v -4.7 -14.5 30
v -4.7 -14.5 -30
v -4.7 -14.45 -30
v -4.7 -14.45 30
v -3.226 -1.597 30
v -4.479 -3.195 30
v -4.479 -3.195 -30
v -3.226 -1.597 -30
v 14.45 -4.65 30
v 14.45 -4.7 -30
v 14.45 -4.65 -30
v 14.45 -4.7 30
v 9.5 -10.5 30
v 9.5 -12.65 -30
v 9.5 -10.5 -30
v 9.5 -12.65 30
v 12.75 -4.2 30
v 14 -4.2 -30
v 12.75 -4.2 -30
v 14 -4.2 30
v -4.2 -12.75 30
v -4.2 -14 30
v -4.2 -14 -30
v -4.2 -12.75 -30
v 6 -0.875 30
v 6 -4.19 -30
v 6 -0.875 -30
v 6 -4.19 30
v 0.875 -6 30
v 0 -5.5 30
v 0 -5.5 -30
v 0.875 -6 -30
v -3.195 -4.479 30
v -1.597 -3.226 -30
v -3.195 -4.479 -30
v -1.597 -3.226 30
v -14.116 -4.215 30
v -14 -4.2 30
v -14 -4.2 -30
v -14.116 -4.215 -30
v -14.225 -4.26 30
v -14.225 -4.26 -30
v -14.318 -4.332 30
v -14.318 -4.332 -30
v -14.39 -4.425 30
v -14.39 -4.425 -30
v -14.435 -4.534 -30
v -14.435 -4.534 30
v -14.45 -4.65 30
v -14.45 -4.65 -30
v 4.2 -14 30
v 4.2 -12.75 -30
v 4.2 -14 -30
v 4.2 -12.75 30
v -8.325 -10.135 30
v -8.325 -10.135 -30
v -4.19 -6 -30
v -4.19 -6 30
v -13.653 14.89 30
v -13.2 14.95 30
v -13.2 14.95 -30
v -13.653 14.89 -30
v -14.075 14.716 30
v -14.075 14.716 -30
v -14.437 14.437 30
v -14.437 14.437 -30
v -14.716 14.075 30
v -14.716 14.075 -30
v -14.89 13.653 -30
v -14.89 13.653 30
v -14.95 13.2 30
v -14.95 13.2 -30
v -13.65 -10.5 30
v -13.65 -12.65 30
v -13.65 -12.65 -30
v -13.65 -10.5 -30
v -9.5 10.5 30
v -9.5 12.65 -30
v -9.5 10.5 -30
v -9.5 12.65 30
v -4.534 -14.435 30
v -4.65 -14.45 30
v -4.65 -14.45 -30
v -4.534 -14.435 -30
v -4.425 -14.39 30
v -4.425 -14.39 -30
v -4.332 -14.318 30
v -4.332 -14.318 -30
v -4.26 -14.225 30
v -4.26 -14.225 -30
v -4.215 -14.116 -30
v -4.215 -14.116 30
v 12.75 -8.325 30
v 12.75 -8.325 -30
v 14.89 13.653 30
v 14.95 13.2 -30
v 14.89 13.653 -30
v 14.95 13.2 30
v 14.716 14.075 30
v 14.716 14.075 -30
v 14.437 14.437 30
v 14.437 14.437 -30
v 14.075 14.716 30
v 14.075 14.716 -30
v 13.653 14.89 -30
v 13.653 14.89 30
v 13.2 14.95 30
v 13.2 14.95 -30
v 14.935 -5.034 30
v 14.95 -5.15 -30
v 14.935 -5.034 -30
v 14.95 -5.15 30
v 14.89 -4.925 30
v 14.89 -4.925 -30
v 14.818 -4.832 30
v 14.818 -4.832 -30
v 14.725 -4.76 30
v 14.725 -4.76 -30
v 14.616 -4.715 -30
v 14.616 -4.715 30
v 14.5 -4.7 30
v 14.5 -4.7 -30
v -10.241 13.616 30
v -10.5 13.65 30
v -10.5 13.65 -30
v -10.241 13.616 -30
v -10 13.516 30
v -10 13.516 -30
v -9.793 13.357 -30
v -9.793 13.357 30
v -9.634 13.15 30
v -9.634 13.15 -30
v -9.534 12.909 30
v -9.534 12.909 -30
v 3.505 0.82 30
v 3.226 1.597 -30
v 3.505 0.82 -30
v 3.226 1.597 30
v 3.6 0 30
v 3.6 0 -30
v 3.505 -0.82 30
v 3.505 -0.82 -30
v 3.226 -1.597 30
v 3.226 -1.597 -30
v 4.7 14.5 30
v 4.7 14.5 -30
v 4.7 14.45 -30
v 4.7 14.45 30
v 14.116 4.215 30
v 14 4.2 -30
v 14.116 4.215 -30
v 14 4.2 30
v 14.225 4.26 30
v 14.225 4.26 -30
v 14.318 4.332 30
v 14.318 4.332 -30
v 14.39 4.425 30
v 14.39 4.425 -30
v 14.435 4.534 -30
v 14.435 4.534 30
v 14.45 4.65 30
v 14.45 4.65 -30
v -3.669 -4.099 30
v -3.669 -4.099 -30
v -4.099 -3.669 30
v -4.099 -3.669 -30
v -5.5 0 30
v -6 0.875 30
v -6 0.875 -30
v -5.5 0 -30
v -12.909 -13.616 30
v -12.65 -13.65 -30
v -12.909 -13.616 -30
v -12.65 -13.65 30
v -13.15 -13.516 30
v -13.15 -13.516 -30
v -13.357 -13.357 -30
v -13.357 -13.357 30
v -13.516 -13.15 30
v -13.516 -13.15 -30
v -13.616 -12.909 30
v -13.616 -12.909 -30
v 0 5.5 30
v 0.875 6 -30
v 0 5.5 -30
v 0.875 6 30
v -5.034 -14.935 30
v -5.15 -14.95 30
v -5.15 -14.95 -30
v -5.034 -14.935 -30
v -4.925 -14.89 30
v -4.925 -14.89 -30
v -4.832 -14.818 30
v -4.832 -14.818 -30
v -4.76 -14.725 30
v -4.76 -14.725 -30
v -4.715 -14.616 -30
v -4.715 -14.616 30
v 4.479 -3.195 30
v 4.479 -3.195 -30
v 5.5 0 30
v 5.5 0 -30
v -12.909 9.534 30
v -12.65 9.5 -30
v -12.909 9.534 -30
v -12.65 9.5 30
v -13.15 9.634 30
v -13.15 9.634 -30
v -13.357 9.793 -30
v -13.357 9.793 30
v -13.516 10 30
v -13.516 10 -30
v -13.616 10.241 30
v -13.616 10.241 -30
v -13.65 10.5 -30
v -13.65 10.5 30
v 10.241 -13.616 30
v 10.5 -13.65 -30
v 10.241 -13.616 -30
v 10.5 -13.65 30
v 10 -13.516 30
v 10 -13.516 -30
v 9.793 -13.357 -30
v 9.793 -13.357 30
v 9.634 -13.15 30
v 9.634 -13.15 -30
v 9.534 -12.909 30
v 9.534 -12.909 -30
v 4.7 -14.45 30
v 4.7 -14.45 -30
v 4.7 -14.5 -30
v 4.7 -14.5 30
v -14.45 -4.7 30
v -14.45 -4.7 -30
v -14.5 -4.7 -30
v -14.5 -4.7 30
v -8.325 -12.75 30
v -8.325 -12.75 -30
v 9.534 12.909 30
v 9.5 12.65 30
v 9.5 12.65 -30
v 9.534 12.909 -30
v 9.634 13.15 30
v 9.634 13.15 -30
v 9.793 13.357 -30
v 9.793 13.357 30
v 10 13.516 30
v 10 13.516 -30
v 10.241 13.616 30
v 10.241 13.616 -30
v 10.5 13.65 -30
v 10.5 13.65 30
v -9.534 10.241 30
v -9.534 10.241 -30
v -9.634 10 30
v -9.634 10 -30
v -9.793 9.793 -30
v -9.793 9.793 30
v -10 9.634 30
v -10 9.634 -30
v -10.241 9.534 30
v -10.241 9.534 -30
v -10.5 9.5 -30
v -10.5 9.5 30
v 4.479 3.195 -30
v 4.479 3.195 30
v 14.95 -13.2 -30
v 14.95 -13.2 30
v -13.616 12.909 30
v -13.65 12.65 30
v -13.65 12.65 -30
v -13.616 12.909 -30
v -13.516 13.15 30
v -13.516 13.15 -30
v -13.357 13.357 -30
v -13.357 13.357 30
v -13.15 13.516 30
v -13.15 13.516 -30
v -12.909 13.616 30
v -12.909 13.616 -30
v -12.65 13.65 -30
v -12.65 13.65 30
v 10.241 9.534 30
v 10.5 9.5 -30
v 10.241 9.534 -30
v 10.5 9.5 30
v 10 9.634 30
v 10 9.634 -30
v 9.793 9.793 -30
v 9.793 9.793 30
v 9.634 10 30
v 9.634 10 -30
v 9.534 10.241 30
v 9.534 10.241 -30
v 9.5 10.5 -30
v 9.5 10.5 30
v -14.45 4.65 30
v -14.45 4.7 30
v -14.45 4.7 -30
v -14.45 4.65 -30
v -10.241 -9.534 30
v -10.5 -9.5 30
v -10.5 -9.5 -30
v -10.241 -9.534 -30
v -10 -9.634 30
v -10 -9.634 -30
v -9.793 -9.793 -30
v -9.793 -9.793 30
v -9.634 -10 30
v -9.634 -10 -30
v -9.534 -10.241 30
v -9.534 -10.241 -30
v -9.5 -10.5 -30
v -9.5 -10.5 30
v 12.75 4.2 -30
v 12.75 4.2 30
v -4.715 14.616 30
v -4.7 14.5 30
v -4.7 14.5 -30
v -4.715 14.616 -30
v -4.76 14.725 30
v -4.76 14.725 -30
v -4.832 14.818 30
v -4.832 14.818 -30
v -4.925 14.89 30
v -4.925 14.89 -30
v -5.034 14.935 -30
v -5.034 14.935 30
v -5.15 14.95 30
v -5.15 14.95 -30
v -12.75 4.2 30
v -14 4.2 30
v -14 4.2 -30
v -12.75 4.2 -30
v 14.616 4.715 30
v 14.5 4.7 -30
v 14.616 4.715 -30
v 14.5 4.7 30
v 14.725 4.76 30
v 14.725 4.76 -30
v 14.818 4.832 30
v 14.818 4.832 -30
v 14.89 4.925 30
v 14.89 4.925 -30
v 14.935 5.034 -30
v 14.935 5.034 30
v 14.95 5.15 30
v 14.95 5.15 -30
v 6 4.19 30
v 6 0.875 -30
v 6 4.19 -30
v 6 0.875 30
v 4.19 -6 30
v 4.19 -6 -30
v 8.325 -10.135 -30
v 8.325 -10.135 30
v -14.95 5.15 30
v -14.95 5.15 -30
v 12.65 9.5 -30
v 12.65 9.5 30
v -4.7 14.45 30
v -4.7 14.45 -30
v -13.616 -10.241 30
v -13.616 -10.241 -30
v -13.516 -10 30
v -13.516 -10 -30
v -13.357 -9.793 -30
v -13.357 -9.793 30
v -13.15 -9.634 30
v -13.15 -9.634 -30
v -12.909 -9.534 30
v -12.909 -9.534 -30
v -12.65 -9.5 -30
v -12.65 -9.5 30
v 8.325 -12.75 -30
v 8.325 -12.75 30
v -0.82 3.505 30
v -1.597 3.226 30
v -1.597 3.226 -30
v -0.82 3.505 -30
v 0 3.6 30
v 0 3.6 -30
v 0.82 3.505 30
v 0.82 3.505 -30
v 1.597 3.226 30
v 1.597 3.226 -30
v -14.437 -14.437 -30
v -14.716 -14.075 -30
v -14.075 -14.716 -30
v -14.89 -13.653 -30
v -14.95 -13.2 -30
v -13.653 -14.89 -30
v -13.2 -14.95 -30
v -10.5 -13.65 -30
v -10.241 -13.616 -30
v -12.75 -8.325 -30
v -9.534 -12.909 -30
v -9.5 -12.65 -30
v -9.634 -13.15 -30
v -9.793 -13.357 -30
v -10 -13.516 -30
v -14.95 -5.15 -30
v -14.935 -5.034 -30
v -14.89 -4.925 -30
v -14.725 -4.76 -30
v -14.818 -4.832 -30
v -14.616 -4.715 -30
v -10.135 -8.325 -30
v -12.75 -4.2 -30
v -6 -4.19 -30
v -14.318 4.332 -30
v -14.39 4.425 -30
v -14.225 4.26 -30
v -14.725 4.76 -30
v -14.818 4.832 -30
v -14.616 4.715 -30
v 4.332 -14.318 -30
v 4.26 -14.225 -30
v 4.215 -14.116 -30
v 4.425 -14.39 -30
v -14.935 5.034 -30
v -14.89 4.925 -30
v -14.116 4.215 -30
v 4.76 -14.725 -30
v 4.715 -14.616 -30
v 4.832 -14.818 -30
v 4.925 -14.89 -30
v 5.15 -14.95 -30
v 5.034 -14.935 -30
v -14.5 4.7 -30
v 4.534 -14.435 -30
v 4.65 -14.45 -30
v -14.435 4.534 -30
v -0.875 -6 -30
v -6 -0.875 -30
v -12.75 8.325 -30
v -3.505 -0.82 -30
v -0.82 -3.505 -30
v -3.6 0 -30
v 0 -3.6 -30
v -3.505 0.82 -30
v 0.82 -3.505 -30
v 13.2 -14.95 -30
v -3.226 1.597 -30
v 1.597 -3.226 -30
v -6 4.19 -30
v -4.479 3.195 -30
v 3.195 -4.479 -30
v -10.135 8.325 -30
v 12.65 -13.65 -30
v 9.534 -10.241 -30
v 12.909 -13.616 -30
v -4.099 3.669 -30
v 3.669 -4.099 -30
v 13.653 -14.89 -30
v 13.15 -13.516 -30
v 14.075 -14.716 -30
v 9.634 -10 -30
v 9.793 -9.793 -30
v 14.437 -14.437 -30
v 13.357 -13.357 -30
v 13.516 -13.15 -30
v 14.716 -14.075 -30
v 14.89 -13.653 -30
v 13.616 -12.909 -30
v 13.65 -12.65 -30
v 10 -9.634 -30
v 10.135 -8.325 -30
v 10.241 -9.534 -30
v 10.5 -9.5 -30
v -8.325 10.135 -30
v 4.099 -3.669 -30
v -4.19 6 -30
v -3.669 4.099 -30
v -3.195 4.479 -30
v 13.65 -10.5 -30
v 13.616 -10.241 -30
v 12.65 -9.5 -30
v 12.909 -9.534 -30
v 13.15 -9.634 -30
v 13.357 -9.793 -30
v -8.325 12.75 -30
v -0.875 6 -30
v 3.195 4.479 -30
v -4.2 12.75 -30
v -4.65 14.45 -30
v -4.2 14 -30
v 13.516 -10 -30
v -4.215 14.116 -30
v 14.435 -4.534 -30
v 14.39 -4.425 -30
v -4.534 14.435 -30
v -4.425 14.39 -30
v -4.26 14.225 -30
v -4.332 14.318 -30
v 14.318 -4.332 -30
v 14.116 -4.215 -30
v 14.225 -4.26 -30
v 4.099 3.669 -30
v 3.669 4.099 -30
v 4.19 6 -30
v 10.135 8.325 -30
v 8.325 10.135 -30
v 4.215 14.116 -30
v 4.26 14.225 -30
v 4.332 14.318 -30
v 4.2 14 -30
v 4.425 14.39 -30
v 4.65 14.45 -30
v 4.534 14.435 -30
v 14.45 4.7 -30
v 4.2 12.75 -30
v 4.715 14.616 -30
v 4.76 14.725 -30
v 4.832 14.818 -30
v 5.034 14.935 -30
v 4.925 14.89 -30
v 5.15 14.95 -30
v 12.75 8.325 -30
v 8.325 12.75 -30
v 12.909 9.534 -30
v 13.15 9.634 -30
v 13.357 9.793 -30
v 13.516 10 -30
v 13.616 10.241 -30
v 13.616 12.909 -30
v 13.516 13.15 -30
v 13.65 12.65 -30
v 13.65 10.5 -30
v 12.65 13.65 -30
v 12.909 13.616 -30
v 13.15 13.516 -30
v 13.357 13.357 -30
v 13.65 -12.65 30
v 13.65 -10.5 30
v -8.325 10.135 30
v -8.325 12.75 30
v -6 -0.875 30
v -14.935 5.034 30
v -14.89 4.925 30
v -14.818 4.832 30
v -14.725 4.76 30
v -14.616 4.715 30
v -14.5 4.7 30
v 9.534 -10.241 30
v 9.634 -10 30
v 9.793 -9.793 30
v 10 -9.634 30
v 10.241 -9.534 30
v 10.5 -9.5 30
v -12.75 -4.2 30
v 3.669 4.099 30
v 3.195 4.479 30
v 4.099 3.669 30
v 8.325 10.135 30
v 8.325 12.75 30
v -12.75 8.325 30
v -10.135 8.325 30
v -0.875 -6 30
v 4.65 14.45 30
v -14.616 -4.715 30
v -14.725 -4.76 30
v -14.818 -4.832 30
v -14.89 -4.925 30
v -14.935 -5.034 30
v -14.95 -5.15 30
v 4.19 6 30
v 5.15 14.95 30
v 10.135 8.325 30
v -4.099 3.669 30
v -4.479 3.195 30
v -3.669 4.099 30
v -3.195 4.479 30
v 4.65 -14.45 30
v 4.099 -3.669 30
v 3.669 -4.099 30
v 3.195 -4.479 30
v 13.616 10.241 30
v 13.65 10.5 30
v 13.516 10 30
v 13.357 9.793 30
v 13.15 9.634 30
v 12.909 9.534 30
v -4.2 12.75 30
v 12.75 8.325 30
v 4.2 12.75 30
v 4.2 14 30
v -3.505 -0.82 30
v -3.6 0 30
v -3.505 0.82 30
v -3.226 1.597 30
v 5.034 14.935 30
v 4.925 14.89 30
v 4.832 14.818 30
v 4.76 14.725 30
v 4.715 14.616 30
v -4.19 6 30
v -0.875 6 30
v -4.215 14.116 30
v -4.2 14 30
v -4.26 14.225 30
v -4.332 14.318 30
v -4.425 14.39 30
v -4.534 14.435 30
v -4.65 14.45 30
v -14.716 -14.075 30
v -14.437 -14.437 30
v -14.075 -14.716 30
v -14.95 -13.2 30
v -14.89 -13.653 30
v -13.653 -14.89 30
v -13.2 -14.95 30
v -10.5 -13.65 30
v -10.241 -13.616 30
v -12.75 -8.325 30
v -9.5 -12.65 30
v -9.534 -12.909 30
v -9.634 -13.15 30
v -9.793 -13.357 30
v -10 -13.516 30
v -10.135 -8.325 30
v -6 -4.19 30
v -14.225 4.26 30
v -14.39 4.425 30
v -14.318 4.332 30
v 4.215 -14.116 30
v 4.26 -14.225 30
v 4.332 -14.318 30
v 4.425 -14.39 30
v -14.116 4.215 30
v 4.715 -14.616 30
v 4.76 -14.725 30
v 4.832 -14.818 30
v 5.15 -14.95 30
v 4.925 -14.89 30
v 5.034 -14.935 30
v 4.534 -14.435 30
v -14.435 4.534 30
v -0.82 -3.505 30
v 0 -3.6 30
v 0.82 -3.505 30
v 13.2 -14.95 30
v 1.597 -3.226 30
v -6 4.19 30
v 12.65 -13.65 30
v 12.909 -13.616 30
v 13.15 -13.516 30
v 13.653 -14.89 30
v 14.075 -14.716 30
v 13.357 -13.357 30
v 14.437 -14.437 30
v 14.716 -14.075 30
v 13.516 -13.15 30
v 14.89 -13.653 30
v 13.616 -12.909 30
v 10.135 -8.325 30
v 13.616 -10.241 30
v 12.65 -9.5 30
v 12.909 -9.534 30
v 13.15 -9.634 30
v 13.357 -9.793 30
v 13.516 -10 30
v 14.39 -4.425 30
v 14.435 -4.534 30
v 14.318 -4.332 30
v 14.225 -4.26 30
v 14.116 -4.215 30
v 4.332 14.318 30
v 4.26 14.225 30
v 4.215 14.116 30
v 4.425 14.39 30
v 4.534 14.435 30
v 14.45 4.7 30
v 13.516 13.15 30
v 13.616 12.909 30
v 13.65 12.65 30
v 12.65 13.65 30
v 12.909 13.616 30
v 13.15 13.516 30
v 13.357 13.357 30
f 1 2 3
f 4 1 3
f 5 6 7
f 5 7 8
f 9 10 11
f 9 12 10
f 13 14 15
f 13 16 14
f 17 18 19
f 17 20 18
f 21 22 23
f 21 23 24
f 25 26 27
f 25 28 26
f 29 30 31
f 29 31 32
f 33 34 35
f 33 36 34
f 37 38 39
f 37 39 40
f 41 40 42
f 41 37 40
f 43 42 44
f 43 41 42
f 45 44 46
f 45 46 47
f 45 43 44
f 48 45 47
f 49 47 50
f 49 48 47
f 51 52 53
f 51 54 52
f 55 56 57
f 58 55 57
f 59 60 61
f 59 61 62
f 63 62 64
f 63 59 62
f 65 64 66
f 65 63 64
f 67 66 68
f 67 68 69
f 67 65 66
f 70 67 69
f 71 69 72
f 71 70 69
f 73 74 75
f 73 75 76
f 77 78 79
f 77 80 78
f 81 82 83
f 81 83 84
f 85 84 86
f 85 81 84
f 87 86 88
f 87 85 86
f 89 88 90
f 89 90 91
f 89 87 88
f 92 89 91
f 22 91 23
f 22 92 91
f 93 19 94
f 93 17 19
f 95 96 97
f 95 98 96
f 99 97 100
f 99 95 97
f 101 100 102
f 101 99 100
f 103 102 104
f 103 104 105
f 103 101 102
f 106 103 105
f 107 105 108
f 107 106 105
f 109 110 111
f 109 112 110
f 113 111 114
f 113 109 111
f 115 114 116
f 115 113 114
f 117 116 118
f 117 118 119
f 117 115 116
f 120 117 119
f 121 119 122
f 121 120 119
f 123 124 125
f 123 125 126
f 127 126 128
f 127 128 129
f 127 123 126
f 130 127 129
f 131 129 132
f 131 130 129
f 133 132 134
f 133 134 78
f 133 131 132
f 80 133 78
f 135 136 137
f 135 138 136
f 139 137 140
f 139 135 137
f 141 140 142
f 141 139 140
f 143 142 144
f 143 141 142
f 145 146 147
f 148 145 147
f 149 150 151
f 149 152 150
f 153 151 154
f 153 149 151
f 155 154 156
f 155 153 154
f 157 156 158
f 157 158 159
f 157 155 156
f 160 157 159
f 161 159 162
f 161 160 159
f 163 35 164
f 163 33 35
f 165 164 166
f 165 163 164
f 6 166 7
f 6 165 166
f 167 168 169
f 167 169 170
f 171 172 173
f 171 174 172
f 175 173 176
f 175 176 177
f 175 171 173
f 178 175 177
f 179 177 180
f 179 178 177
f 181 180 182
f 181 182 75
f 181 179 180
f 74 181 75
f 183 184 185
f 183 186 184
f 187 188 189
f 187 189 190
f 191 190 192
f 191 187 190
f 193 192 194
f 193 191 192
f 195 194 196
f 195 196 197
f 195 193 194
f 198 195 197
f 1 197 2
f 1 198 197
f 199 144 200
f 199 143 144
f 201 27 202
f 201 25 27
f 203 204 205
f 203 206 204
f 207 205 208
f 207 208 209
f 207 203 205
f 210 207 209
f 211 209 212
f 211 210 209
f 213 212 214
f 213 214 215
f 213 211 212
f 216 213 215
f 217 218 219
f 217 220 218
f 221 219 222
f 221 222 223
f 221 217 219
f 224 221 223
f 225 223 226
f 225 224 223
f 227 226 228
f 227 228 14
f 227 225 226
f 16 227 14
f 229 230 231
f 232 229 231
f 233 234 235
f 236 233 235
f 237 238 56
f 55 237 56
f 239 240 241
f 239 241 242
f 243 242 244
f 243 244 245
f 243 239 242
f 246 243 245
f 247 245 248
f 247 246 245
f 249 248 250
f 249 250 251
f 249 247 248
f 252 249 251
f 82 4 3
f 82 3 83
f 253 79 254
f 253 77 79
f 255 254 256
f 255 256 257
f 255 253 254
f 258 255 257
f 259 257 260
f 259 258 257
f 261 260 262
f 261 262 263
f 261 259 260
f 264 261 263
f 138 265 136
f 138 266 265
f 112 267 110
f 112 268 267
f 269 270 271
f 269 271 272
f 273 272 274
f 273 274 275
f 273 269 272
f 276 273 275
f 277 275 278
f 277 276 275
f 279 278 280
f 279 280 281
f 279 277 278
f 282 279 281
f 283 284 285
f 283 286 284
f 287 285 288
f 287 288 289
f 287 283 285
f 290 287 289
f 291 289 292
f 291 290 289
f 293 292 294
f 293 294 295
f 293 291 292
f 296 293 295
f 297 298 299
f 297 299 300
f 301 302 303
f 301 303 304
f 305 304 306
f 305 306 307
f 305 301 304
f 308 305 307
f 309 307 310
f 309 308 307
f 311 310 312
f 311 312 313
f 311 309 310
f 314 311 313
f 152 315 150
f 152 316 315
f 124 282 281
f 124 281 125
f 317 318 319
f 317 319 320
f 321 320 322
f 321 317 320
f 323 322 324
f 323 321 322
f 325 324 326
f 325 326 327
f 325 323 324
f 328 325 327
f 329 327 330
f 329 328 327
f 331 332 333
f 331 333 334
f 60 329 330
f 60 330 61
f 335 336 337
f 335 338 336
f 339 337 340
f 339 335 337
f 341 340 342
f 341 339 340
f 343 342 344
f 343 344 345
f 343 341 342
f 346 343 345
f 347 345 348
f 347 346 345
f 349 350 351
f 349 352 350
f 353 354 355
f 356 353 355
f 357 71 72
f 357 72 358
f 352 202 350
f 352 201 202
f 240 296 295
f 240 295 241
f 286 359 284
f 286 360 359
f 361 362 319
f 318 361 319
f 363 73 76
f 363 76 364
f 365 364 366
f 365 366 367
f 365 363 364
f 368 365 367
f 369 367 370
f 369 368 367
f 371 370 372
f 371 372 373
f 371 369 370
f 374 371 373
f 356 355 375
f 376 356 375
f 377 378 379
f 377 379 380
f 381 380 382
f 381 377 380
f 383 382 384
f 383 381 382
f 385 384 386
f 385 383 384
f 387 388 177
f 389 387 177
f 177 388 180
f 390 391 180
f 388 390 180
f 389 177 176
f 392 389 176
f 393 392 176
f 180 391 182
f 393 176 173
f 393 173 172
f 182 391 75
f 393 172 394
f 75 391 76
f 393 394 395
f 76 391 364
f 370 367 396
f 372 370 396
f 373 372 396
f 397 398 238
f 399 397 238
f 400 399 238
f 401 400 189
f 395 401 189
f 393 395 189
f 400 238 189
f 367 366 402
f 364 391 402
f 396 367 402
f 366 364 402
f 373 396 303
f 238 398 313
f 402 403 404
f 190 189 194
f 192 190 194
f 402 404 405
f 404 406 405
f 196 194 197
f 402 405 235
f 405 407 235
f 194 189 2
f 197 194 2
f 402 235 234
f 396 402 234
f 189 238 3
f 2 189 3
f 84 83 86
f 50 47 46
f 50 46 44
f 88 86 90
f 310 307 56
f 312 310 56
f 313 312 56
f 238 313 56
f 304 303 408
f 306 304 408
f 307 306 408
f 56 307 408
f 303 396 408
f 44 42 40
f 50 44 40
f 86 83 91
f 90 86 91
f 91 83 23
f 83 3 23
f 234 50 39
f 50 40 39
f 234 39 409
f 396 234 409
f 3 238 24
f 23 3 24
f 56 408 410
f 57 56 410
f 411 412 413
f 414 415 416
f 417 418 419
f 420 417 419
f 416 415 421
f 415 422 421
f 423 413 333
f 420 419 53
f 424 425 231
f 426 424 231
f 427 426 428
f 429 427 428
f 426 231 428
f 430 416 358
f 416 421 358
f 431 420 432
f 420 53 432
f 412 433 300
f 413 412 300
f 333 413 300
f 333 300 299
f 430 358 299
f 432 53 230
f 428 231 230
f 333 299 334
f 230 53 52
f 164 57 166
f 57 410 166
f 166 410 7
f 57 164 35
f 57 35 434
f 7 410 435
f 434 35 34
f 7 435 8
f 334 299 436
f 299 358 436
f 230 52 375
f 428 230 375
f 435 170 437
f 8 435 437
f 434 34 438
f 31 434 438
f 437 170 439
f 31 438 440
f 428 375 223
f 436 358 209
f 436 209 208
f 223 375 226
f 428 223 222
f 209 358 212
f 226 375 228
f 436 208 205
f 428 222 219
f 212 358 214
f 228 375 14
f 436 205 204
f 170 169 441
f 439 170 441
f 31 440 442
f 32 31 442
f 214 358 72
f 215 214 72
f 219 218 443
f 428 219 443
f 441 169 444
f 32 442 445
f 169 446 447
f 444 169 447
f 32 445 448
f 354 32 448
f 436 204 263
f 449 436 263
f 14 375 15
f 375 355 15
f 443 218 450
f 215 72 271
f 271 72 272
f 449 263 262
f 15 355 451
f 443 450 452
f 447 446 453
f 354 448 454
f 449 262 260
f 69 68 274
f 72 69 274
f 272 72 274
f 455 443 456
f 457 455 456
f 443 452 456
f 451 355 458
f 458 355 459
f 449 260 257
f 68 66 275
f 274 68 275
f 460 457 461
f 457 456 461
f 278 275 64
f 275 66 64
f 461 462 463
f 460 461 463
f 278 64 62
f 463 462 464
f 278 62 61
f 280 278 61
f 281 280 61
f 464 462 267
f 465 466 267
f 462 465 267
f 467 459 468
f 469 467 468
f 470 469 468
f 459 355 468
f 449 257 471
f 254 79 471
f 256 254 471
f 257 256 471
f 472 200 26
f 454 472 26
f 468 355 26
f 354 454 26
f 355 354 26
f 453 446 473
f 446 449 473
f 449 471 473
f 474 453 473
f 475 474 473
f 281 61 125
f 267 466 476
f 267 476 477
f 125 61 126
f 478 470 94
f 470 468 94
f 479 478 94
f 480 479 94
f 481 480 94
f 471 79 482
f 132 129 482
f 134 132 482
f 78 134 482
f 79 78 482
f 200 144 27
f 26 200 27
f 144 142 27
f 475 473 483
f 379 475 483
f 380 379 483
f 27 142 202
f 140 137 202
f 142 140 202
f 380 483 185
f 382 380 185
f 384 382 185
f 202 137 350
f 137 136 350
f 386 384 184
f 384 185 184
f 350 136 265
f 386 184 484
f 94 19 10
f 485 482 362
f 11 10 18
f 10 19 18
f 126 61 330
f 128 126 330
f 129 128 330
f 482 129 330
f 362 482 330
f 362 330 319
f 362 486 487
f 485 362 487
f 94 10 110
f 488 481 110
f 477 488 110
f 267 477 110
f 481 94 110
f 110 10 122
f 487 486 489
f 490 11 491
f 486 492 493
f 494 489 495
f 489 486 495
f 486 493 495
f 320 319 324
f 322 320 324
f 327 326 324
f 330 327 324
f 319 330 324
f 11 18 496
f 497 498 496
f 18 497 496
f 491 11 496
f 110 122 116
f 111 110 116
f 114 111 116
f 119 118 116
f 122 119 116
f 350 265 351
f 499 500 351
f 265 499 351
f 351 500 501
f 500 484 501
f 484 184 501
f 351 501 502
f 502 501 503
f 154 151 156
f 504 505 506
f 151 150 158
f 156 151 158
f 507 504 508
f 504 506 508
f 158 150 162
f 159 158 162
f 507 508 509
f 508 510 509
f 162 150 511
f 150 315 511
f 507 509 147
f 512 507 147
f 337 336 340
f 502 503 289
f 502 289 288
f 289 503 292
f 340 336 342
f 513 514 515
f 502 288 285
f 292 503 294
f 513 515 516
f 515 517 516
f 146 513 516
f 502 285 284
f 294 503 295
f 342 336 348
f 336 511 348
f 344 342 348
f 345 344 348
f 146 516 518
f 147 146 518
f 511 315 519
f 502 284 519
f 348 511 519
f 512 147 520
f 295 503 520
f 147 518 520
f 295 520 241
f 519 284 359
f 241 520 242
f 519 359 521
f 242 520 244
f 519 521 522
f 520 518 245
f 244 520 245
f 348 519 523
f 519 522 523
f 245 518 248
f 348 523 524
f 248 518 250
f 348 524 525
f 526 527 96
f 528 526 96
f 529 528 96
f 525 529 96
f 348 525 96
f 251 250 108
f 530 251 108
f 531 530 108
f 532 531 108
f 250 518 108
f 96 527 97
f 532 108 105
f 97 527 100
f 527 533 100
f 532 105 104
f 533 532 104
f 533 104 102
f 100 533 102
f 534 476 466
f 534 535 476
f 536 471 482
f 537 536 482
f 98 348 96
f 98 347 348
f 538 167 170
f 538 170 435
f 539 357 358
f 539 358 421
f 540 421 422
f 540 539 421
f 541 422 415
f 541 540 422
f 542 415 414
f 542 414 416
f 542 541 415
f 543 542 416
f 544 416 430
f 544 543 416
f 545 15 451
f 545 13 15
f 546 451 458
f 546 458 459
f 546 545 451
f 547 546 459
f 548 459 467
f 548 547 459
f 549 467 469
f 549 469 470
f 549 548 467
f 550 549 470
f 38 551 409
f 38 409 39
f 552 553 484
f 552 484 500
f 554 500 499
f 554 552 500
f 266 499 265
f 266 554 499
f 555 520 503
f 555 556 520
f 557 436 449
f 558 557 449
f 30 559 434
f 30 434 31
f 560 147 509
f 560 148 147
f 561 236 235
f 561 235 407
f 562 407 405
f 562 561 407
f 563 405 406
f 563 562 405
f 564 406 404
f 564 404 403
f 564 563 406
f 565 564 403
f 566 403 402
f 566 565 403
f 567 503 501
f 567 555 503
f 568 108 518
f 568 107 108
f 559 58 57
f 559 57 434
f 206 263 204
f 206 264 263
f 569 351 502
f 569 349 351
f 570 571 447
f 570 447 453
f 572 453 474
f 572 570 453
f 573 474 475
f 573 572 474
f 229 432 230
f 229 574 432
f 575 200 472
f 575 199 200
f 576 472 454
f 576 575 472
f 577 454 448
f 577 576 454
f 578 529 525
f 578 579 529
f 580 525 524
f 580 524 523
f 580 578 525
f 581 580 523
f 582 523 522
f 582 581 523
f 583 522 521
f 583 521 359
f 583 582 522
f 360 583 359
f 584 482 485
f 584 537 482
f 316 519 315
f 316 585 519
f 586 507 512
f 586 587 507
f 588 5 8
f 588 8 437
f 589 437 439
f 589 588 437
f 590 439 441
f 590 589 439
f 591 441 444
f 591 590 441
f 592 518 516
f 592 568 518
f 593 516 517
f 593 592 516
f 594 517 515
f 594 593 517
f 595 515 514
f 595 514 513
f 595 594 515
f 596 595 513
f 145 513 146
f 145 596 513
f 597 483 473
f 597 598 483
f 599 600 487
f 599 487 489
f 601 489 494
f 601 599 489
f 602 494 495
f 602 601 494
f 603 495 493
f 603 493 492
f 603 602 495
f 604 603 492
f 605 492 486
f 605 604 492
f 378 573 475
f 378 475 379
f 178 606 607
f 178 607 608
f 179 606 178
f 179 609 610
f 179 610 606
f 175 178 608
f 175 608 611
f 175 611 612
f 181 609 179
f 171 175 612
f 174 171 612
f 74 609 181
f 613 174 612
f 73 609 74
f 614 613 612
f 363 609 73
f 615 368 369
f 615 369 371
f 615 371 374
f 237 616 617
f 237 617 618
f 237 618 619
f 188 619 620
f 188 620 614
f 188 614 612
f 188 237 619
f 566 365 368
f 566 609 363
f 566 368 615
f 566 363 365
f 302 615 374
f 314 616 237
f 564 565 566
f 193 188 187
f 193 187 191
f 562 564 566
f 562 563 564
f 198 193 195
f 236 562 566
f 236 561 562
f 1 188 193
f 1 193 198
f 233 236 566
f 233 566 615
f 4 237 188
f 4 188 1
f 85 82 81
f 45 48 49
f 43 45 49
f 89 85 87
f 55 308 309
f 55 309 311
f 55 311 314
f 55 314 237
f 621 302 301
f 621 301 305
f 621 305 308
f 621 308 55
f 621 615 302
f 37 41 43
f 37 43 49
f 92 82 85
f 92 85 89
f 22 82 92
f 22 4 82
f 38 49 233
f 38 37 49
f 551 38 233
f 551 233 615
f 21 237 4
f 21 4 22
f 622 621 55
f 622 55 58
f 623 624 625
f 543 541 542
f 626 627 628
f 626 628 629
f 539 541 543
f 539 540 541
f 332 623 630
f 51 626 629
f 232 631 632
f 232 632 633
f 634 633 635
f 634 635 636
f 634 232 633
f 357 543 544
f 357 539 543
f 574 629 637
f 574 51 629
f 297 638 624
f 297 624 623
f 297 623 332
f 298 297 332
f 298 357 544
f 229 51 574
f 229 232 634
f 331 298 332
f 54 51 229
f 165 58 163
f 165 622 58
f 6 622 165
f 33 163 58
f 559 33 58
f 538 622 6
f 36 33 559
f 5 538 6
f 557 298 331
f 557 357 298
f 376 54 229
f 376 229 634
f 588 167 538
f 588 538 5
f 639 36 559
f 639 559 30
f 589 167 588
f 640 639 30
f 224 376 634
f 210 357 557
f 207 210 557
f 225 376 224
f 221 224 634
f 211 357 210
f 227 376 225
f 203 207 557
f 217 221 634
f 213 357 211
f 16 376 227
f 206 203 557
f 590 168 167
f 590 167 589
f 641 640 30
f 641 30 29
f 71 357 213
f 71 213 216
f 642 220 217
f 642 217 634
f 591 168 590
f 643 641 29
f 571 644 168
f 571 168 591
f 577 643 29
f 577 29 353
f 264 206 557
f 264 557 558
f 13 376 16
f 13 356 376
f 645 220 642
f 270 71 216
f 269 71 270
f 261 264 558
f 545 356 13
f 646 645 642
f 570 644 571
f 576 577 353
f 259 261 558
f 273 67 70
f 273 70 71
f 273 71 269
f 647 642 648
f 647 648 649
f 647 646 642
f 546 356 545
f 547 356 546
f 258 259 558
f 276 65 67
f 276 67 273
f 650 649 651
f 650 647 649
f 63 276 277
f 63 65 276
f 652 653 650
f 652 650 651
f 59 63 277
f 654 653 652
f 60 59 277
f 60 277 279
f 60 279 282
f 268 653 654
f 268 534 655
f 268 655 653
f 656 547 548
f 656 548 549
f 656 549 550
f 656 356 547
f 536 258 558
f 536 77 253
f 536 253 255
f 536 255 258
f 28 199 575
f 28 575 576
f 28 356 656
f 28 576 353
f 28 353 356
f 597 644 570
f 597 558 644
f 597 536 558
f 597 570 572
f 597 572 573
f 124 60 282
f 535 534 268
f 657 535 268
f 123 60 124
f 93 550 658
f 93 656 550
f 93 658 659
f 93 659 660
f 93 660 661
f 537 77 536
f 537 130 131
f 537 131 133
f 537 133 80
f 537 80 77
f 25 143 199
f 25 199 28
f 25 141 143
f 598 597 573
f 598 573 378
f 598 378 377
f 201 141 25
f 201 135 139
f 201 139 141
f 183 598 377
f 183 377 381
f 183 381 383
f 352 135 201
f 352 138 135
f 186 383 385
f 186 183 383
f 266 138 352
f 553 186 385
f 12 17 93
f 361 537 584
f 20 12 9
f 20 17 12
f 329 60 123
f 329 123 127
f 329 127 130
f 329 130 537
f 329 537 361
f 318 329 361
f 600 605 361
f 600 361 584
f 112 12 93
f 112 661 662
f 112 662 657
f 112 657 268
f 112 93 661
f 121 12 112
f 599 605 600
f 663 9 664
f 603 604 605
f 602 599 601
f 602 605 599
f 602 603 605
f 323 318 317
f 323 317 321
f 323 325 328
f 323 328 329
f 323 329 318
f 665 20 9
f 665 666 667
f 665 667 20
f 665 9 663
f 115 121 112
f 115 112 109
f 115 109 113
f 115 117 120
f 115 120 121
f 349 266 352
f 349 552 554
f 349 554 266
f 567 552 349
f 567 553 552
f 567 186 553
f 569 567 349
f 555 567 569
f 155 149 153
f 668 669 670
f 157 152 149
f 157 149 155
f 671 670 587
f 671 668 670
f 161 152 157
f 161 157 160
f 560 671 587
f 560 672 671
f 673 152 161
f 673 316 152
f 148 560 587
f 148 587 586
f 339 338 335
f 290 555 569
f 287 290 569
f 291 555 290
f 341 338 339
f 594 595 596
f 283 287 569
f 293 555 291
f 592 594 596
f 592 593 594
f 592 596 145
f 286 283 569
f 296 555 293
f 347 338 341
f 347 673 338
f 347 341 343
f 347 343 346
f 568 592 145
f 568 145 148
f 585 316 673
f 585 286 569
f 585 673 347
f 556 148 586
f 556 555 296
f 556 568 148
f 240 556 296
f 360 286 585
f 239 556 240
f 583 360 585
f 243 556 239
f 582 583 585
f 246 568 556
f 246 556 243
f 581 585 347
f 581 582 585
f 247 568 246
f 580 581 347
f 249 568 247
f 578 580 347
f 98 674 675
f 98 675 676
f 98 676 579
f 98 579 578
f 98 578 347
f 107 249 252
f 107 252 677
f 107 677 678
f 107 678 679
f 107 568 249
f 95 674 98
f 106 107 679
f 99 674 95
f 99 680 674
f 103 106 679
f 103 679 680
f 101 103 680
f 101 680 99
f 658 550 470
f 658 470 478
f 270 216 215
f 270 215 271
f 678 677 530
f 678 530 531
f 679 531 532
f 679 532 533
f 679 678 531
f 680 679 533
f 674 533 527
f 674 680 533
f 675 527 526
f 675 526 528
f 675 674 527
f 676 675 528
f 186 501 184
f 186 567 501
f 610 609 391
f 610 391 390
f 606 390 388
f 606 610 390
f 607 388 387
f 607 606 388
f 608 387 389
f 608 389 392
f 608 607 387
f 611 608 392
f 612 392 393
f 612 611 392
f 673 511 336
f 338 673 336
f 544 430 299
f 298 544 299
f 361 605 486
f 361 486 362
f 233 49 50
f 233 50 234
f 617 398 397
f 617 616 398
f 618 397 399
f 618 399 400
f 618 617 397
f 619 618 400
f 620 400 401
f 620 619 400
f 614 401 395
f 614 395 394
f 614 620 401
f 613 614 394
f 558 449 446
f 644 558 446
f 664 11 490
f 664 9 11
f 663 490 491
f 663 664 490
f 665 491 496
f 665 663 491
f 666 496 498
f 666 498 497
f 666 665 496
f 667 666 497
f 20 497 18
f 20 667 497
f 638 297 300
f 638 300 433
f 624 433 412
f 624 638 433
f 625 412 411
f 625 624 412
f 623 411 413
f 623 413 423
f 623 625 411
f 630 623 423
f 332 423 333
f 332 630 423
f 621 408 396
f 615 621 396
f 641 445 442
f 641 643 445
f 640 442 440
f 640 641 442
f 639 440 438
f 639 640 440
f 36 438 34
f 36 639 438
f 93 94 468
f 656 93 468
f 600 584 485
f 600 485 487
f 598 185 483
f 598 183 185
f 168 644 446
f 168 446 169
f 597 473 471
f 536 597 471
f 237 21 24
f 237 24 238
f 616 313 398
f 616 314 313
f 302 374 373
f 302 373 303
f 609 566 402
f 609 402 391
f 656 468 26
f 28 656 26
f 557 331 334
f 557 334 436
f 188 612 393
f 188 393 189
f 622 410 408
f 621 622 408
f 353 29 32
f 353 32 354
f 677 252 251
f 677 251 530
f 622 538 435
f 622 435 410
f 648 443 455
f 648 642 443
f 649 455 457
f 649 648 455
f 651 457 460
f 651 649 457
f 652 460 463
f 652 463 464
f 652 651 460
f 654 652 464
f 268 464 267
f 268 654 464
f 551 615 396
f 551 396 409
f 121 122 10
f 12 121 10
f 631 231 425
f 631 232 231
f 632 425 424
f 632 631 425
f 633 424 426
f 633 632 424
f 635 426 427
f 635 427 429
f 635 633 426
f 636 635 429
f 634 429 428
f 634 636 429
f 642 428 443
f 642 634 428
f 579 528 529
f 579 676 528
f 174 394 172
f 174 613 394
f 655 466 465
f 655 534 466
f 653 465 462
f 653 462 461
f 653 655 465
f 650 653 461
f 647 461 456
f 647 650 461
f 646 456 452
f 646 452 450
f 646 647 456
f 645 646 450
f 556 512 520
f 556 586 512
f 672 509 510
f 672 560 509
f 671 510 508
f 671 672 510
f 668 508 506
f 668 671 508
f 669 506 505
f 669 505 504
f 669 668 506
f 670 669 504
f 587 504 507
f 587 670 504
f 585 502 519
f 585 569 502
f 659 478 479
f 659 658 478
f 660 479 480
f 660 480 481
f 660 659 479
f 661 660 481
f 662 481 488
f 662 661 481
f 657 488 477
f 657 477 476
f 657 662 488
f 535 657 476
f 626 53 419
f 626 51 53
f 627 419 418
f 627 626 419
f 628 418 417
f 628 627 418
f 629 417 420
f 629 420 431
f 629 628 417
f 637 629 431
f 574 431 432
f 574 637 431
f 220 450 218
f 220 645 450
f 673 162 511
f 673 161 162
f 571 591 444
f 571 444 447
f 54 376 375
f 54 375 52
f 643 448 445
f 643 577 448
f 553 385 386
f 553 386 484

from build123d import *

# Parameters (mm, degrees)
BOSS_EXTRUDE1_DEPTH = 30


with BuildPart() as part:
    # Sketch1 → Boss-Extrude1 (new body, symmetric)
    with BuildSketch(Plane.XY):
        with BuildLine():
            Line((-8.325, 12.75), (-4.2, 12.75))
            Line((-4.2, 12.75), (-4.2, 14))
            ThreePointArc((-4.2, 14), (-4.331801948, 14.318198052), (-4.65, 14.45))
            Line((-4.65, 14.45), (-4.7, 14.45))
            Line((-4.7, 14.45), (-4.7, 14.5))
            ThreePointArc((-4.7, 14.5), (-4.831801948, 14.818198052), (-5.15, 14.95))
            Line((-5.15, 14.95), (-13.2, 14.95))
            ThreePointArc((-13.2, 14.95), (-14.437436867, 14.437436867), (-14.95, 13.2))
            Line((-14.95, 13.2), (-14.95, 5.15))
            ThreePointArc((-14.95, 5.15), (-14.818198052, 4.831801948), (-14.5, 4.7))
            Line((-14.5, 4.7), (-14.45, 4.7))
            Line((-14.45, 4.7), (-14.45, 4.65))
            ThreePointArc((-14.45, 4.65), (-14.318198052, 4.331801948), (-14, 4.2))
            Line((-14, 4.2), (-12.75, 4.2))
            Line((-12.75, 4.2), (-12.75, 8.325))
            Line((-12.75, 8.325), (-10.13519336, 8.325))
            Line((-10.13519336, 8.325), (-6, 4.18980664))
            Line((-6, 4.18980664), (-6, 0.875))
            Line((-6, 0.875), (-5.5, 0))
            Line((-5.5, 0), (-6, -0.875))
            Line((-6, -0.875), (-6, -4.18980664))
            Line((-6, -4.18980664), (-10.13519336, -8.325))
            Line((-10.13519336, -8.325), (-12.75, -8.325))
            Line((-12.75, -8.325), (-12.75, -4.2))
            Line((-12.75, -4.2), (-14, -4.2))
            ThreePointArc((-14, -4.2), (-14.318198052, -4.331801948), (-14.45, -4.65))
            Line((-14.45, -4.65), (-14.45, -4.7))
            Line((-14.45, -4.7), (-14.5, -4.7))
            ThreePointArc((-14.5, -4.7), (-14.818198052, -4.831801948), (-14.95, -5.15))
            Line((-14.95, -5.15), (-14.95, -13.2))
            ThreePointArc((-14.95, -13.2), (-14.437436867, -14.437436867), (-13.2, -14.95))
            Line((-13.2, -14.95), (-5.15, -14.95))
            ThreePointArc((-5.15, -14.95), (-4.831801948, -14.818198052), (-4.7, -14.5))
            Line((-4.7, -14.5), (-4.7, -14.45))
            Line((-4.7, -14.45), (-4.65, -14.45))
            ThreePointArc((-4.65, -14.45), (-4.331801948, -14.318198052), (-4.2, -14))
            Line((-4.2, -14), (-4.2, -12.75))
            Line((-4.2, -12.75), (-8.325, -12.75))
            Line((-8.325, -12.75), (-8.325, -10.13519336))
            Line((-8.325, -10.13519336), (-4.18980664, -6))
            Line((-4.18980664, -6), (-0.875, -6))
            Line((-0.875, -6), (0, -5.5))
            Line((0, -5.5), (0.875, -6))
            Line((0.875, -6), (4.18980664, -6))
            Line((4.18980664, -6), (8.325, -10.13519336))
            Line((8.325, -10.13519336), (8.325, -12.75))
            Line((8.325, -12.75), (4.2, -12.75))
            Line((4.2, -12.75), (4.2, -14))
            ThreePointArc((4.2, -14), (4.331801948, -14.318198052), (4.65, -14.45))
            Line((4.65, -14.45), (4.7, -14.45))
            Line((4.7, -14.45), (4.7, -14.5))
            ThreePointArc((4.7, -14.5), (4.831801948, -14.818198052), (5.15, -14.95))
            Line((5.15, -14.95), (13.2, -14.95))
            ThreePointArc((13.2, -14.95), (14.437436867, -14.437436867), (14.95, -13.2))
            Line((14.95, -13.2), (14.95, -5.15))
            ThreePointArc((14.95, -5.15), (14.818198052, -4.831801948), (14.5, -4.7))
            Line((14.5, -4.7), (14.45, -4.7))
            Line((14.45, -4.7), (14.45, -4.65))
            ThreePointArc((14.45, -4.65), (14.318198052, -4.331801948), (14, -4.2))
            Line((14, -4.2), (12.75, -4.2))
            Line((12.75, -4.2), (12.75, -8.325))
            Line((12.75, -8.325), (10.13519336, -8.325))
            Line((10.13519336, -8.325), (6, -4.18980664))
            Line((6, -4.18980664), (6, -0.875))
            Line((6, -0.875), (5.5, 0))
            Line((5.5, 0), (6, 0.875))
            Line((6, 0.875), (6, 4.18980664))
            Line((6, 4.18980664), (10.134787333, 8.324593973))
            Line((10.134787333, 8.324593973), (12.75, 8.324593973))
            Line((12.75, 8.324593973), (12.75, 4.2))
            Line((12.75, 4.2), (14, 4.2))
            ThreePointArc((14, 4.2), (14.318198052, 4.331801948), (14.45, 4.65))
            Line((14.45, 4.65), (14.45, 4.7))
            Line((14.45, 4.7), (14.5, 4.7))
            ThreePointArc((14.5, 4.7), (14.818198052, 4.831801948), (14.95, 5.15))
            Line((14.95, 5.15), (14.95, 13.2))
            ThreePointArc((14.95, 13.2), (14.437436867, 14.437436867), (13.2, 14.95))
            Line((13.2, 14.95), (5.15, 14.95))
            ThreePointArc((5.15, 14.95), (4.831801948, 14.818198052), (4.7, 14.5))
            Line((4.7, 14.5), (4.7, 14.45))
            Line((4.7, 14.45), (4.65, 14.45))
            ThreePointArc((4.65, 14.45), (4.331801948, 14.318198052), (4.2, 14))
            Line((4.2, 14), (4.2, 12.75))
            Line((4.2, 12.75), (8.324593973, 12.75))
            Line((8.324593973, 12.75), (8.324593973, 10.134787333))
            Line((8.324593973, 10.134787333), (4.18980664, 6))
            Line((4.18980664, 6), (0.875, 6))
            Line((0.875, 6), (0, 5.5))
            Line((0, 5.5), (-0.875, 6))
            Line((-0.875, 6), (-4.18980664, 6))
            Line((-4.18980664, 6), (-8.325, 10.13519336))
            Line((-8.325, 10.13519336), (-8.325, 12.75))
        make_face()
        with BuildLine():
            Line((-4.478803313, -3.194699355), (-3.226318161, -1.597144679))
            ThreePointArc((-3.226318161, -1.597144679), (-3.6, 0), (-3.226318161, 1.597144679))
            Line((-3.226318161, 1.597144679), (-4.478803313, 3.194699355))
            ThreePointArc((-4.478803313, 3.194699355), (-3.890101739, 3.890101739), (-3.194699355, 4.478803313))
            Line((-3.194699355, 4.478803313), (-1.597144679, 3.226318161))
            ThreePointArc((-1.597144679, 3.226318161), (0, 3.6), (1.597144679, 3.226318161))
            Line((1.597144679, 3.226318161), (3.194699355, 4.478803313))
            ThreePointArc((3.194699355, 4.478803313), (3.890101739, 3.890101739), (4.478803313, 3.194699355))
            Line((4.478803313, 3.194699355), (3.226318161, 1.597144679))
            ThreePointArc((3.226318161, 1.597144679), (3.6, 0), (3.226318161, -1.597144679))
            Line((3.226318161, -1.597144679), (4.478803313, -3.194699355))
            ThreePointArc((4.478803313, -3.194699355), (3.890101739, -3.890101739), (3.194699355, -4.478803313))
            Line((3.194699355, -4.478803313), (1.597144679, -3.226318161))
            ThreePointArc((1.597144679, -3.226318161), (0, -3.6), (-1.597144679, -3.226318161))
            Line((-1.597144679, -3.226318161), (-3.194699355, -4.478803313))
            ThreePointArc((-3.194699355, -4.478803313), (-3.890101739, -3.890101739), (-4.478803313, -3.194699355))
        make_face(mode=Mode.SUBTRACT)
        with BuildLine():
            Line((-13.65, -12.65), (-13.65, -10.5))
            ThreePointArc((-13.65, -10.5), (-13.357106781, -9.792893219), (-12.65, -9.5))
            Line((-12.65, -9.5), (-10.5, -9.5))
            ThreePointArc((-10.5, -9.5), (-9.792893219, -9.792893219), (-9.5, -10.5))
            Line((-9.5, -10.5), (-9.5, -12.65))
            ThreePointArc((-9.5, -12.65), (-9.792893219, -13.357106781), (-10.5, -13.65))
            Line((-10.5, -13.65), (-12.65, -13.65))
            ThreePointArc((-12.65, -13.65), (-13.357106781, -13.357106781), (-13.65, -12.65))
        make_face(mode=Mode.SUBTRACT)
        with BuildLine():
            Line((9.5, 10.5), (9.5, 12.65))
            ThreePointArc((9.5, 12.65), (9.792893219, 13.357106781), (10.5, 13.65))
            Line((10.5, 13.65), (12.65, 13.65))
            ThreePointArc((12.65, 13.65), (13.357106781, 13.357106781), (13.65, 12.65))
            Line((13.65, 12.65), (13.65, 10.5))
            ThreePointArc((13.65, 10.5), (13.357106781, 9.792893219), (12.65, 9.5))
            Line((12.65, 9.5), (10.5, 9.5))
            ThreePointArc((10.5, 9.5), (9.792893219, 9.792893219), (9.5, 10.5))
        make_face(mode=Mode.SUBTRACT)
        with BuildLine():
            Line((-13.65, 10.5), (-13.65, 12.65))
            ThreePointArc((-13.65, 12.65), (-13.357106781, 13.357106781), (-12.65, 13.65))
            Line((-12.65, 13.65), (-10.5, 13.65))
            ThreePointArc((-10.5, 13.65), (-9.792893219, 13.357106781), (-9.5, 12.65))
            Line((-9.5, 12.65), (-9.5, 10.5))
            ThreePointArc((-9.5, 10.5), (-9.792893219, 9.792893219), (-10.5, 9.5))
            Line((-10.5, 9.5), (-12.65, 9.5))
            ThreePointArc((-12.65, 9.5), (-13.357106781, 9.792893219), (-13.65, 10.5))
        make_face(mode=Mode.SUBTRACT)
        with BuildLine():
            Line((10.5, -9.5), (12.65, -9.5))
            ThreePointArc((12.65, -9.5), (13.357106781, -9.792893219), (13.65, -10.5))
            Line((13.65, -10.5), (13.65, -12.65))
            ThreePointArc((13.65, -12.65), (13.357106781, -13.357106781), (12.65, -13.65))
            Line((12.65, -13.65), (10.5, -13.65))
            ThreePointArc((10.5, -13.65), (9.792893219, -13.357106781), (9.5, -12.65))
            Line((9.5, -12.65), (9.5, -10.5))
            ThreePointArc((9.5, -10.5), (9.792893219, -9.792893219), (10.5, -9.5))
        make_face(mode=Mode.SUBTRACT)
    extrude(amount=BOSS_EXTRUDE1_DEPTH, both=True)


solid = part.part
